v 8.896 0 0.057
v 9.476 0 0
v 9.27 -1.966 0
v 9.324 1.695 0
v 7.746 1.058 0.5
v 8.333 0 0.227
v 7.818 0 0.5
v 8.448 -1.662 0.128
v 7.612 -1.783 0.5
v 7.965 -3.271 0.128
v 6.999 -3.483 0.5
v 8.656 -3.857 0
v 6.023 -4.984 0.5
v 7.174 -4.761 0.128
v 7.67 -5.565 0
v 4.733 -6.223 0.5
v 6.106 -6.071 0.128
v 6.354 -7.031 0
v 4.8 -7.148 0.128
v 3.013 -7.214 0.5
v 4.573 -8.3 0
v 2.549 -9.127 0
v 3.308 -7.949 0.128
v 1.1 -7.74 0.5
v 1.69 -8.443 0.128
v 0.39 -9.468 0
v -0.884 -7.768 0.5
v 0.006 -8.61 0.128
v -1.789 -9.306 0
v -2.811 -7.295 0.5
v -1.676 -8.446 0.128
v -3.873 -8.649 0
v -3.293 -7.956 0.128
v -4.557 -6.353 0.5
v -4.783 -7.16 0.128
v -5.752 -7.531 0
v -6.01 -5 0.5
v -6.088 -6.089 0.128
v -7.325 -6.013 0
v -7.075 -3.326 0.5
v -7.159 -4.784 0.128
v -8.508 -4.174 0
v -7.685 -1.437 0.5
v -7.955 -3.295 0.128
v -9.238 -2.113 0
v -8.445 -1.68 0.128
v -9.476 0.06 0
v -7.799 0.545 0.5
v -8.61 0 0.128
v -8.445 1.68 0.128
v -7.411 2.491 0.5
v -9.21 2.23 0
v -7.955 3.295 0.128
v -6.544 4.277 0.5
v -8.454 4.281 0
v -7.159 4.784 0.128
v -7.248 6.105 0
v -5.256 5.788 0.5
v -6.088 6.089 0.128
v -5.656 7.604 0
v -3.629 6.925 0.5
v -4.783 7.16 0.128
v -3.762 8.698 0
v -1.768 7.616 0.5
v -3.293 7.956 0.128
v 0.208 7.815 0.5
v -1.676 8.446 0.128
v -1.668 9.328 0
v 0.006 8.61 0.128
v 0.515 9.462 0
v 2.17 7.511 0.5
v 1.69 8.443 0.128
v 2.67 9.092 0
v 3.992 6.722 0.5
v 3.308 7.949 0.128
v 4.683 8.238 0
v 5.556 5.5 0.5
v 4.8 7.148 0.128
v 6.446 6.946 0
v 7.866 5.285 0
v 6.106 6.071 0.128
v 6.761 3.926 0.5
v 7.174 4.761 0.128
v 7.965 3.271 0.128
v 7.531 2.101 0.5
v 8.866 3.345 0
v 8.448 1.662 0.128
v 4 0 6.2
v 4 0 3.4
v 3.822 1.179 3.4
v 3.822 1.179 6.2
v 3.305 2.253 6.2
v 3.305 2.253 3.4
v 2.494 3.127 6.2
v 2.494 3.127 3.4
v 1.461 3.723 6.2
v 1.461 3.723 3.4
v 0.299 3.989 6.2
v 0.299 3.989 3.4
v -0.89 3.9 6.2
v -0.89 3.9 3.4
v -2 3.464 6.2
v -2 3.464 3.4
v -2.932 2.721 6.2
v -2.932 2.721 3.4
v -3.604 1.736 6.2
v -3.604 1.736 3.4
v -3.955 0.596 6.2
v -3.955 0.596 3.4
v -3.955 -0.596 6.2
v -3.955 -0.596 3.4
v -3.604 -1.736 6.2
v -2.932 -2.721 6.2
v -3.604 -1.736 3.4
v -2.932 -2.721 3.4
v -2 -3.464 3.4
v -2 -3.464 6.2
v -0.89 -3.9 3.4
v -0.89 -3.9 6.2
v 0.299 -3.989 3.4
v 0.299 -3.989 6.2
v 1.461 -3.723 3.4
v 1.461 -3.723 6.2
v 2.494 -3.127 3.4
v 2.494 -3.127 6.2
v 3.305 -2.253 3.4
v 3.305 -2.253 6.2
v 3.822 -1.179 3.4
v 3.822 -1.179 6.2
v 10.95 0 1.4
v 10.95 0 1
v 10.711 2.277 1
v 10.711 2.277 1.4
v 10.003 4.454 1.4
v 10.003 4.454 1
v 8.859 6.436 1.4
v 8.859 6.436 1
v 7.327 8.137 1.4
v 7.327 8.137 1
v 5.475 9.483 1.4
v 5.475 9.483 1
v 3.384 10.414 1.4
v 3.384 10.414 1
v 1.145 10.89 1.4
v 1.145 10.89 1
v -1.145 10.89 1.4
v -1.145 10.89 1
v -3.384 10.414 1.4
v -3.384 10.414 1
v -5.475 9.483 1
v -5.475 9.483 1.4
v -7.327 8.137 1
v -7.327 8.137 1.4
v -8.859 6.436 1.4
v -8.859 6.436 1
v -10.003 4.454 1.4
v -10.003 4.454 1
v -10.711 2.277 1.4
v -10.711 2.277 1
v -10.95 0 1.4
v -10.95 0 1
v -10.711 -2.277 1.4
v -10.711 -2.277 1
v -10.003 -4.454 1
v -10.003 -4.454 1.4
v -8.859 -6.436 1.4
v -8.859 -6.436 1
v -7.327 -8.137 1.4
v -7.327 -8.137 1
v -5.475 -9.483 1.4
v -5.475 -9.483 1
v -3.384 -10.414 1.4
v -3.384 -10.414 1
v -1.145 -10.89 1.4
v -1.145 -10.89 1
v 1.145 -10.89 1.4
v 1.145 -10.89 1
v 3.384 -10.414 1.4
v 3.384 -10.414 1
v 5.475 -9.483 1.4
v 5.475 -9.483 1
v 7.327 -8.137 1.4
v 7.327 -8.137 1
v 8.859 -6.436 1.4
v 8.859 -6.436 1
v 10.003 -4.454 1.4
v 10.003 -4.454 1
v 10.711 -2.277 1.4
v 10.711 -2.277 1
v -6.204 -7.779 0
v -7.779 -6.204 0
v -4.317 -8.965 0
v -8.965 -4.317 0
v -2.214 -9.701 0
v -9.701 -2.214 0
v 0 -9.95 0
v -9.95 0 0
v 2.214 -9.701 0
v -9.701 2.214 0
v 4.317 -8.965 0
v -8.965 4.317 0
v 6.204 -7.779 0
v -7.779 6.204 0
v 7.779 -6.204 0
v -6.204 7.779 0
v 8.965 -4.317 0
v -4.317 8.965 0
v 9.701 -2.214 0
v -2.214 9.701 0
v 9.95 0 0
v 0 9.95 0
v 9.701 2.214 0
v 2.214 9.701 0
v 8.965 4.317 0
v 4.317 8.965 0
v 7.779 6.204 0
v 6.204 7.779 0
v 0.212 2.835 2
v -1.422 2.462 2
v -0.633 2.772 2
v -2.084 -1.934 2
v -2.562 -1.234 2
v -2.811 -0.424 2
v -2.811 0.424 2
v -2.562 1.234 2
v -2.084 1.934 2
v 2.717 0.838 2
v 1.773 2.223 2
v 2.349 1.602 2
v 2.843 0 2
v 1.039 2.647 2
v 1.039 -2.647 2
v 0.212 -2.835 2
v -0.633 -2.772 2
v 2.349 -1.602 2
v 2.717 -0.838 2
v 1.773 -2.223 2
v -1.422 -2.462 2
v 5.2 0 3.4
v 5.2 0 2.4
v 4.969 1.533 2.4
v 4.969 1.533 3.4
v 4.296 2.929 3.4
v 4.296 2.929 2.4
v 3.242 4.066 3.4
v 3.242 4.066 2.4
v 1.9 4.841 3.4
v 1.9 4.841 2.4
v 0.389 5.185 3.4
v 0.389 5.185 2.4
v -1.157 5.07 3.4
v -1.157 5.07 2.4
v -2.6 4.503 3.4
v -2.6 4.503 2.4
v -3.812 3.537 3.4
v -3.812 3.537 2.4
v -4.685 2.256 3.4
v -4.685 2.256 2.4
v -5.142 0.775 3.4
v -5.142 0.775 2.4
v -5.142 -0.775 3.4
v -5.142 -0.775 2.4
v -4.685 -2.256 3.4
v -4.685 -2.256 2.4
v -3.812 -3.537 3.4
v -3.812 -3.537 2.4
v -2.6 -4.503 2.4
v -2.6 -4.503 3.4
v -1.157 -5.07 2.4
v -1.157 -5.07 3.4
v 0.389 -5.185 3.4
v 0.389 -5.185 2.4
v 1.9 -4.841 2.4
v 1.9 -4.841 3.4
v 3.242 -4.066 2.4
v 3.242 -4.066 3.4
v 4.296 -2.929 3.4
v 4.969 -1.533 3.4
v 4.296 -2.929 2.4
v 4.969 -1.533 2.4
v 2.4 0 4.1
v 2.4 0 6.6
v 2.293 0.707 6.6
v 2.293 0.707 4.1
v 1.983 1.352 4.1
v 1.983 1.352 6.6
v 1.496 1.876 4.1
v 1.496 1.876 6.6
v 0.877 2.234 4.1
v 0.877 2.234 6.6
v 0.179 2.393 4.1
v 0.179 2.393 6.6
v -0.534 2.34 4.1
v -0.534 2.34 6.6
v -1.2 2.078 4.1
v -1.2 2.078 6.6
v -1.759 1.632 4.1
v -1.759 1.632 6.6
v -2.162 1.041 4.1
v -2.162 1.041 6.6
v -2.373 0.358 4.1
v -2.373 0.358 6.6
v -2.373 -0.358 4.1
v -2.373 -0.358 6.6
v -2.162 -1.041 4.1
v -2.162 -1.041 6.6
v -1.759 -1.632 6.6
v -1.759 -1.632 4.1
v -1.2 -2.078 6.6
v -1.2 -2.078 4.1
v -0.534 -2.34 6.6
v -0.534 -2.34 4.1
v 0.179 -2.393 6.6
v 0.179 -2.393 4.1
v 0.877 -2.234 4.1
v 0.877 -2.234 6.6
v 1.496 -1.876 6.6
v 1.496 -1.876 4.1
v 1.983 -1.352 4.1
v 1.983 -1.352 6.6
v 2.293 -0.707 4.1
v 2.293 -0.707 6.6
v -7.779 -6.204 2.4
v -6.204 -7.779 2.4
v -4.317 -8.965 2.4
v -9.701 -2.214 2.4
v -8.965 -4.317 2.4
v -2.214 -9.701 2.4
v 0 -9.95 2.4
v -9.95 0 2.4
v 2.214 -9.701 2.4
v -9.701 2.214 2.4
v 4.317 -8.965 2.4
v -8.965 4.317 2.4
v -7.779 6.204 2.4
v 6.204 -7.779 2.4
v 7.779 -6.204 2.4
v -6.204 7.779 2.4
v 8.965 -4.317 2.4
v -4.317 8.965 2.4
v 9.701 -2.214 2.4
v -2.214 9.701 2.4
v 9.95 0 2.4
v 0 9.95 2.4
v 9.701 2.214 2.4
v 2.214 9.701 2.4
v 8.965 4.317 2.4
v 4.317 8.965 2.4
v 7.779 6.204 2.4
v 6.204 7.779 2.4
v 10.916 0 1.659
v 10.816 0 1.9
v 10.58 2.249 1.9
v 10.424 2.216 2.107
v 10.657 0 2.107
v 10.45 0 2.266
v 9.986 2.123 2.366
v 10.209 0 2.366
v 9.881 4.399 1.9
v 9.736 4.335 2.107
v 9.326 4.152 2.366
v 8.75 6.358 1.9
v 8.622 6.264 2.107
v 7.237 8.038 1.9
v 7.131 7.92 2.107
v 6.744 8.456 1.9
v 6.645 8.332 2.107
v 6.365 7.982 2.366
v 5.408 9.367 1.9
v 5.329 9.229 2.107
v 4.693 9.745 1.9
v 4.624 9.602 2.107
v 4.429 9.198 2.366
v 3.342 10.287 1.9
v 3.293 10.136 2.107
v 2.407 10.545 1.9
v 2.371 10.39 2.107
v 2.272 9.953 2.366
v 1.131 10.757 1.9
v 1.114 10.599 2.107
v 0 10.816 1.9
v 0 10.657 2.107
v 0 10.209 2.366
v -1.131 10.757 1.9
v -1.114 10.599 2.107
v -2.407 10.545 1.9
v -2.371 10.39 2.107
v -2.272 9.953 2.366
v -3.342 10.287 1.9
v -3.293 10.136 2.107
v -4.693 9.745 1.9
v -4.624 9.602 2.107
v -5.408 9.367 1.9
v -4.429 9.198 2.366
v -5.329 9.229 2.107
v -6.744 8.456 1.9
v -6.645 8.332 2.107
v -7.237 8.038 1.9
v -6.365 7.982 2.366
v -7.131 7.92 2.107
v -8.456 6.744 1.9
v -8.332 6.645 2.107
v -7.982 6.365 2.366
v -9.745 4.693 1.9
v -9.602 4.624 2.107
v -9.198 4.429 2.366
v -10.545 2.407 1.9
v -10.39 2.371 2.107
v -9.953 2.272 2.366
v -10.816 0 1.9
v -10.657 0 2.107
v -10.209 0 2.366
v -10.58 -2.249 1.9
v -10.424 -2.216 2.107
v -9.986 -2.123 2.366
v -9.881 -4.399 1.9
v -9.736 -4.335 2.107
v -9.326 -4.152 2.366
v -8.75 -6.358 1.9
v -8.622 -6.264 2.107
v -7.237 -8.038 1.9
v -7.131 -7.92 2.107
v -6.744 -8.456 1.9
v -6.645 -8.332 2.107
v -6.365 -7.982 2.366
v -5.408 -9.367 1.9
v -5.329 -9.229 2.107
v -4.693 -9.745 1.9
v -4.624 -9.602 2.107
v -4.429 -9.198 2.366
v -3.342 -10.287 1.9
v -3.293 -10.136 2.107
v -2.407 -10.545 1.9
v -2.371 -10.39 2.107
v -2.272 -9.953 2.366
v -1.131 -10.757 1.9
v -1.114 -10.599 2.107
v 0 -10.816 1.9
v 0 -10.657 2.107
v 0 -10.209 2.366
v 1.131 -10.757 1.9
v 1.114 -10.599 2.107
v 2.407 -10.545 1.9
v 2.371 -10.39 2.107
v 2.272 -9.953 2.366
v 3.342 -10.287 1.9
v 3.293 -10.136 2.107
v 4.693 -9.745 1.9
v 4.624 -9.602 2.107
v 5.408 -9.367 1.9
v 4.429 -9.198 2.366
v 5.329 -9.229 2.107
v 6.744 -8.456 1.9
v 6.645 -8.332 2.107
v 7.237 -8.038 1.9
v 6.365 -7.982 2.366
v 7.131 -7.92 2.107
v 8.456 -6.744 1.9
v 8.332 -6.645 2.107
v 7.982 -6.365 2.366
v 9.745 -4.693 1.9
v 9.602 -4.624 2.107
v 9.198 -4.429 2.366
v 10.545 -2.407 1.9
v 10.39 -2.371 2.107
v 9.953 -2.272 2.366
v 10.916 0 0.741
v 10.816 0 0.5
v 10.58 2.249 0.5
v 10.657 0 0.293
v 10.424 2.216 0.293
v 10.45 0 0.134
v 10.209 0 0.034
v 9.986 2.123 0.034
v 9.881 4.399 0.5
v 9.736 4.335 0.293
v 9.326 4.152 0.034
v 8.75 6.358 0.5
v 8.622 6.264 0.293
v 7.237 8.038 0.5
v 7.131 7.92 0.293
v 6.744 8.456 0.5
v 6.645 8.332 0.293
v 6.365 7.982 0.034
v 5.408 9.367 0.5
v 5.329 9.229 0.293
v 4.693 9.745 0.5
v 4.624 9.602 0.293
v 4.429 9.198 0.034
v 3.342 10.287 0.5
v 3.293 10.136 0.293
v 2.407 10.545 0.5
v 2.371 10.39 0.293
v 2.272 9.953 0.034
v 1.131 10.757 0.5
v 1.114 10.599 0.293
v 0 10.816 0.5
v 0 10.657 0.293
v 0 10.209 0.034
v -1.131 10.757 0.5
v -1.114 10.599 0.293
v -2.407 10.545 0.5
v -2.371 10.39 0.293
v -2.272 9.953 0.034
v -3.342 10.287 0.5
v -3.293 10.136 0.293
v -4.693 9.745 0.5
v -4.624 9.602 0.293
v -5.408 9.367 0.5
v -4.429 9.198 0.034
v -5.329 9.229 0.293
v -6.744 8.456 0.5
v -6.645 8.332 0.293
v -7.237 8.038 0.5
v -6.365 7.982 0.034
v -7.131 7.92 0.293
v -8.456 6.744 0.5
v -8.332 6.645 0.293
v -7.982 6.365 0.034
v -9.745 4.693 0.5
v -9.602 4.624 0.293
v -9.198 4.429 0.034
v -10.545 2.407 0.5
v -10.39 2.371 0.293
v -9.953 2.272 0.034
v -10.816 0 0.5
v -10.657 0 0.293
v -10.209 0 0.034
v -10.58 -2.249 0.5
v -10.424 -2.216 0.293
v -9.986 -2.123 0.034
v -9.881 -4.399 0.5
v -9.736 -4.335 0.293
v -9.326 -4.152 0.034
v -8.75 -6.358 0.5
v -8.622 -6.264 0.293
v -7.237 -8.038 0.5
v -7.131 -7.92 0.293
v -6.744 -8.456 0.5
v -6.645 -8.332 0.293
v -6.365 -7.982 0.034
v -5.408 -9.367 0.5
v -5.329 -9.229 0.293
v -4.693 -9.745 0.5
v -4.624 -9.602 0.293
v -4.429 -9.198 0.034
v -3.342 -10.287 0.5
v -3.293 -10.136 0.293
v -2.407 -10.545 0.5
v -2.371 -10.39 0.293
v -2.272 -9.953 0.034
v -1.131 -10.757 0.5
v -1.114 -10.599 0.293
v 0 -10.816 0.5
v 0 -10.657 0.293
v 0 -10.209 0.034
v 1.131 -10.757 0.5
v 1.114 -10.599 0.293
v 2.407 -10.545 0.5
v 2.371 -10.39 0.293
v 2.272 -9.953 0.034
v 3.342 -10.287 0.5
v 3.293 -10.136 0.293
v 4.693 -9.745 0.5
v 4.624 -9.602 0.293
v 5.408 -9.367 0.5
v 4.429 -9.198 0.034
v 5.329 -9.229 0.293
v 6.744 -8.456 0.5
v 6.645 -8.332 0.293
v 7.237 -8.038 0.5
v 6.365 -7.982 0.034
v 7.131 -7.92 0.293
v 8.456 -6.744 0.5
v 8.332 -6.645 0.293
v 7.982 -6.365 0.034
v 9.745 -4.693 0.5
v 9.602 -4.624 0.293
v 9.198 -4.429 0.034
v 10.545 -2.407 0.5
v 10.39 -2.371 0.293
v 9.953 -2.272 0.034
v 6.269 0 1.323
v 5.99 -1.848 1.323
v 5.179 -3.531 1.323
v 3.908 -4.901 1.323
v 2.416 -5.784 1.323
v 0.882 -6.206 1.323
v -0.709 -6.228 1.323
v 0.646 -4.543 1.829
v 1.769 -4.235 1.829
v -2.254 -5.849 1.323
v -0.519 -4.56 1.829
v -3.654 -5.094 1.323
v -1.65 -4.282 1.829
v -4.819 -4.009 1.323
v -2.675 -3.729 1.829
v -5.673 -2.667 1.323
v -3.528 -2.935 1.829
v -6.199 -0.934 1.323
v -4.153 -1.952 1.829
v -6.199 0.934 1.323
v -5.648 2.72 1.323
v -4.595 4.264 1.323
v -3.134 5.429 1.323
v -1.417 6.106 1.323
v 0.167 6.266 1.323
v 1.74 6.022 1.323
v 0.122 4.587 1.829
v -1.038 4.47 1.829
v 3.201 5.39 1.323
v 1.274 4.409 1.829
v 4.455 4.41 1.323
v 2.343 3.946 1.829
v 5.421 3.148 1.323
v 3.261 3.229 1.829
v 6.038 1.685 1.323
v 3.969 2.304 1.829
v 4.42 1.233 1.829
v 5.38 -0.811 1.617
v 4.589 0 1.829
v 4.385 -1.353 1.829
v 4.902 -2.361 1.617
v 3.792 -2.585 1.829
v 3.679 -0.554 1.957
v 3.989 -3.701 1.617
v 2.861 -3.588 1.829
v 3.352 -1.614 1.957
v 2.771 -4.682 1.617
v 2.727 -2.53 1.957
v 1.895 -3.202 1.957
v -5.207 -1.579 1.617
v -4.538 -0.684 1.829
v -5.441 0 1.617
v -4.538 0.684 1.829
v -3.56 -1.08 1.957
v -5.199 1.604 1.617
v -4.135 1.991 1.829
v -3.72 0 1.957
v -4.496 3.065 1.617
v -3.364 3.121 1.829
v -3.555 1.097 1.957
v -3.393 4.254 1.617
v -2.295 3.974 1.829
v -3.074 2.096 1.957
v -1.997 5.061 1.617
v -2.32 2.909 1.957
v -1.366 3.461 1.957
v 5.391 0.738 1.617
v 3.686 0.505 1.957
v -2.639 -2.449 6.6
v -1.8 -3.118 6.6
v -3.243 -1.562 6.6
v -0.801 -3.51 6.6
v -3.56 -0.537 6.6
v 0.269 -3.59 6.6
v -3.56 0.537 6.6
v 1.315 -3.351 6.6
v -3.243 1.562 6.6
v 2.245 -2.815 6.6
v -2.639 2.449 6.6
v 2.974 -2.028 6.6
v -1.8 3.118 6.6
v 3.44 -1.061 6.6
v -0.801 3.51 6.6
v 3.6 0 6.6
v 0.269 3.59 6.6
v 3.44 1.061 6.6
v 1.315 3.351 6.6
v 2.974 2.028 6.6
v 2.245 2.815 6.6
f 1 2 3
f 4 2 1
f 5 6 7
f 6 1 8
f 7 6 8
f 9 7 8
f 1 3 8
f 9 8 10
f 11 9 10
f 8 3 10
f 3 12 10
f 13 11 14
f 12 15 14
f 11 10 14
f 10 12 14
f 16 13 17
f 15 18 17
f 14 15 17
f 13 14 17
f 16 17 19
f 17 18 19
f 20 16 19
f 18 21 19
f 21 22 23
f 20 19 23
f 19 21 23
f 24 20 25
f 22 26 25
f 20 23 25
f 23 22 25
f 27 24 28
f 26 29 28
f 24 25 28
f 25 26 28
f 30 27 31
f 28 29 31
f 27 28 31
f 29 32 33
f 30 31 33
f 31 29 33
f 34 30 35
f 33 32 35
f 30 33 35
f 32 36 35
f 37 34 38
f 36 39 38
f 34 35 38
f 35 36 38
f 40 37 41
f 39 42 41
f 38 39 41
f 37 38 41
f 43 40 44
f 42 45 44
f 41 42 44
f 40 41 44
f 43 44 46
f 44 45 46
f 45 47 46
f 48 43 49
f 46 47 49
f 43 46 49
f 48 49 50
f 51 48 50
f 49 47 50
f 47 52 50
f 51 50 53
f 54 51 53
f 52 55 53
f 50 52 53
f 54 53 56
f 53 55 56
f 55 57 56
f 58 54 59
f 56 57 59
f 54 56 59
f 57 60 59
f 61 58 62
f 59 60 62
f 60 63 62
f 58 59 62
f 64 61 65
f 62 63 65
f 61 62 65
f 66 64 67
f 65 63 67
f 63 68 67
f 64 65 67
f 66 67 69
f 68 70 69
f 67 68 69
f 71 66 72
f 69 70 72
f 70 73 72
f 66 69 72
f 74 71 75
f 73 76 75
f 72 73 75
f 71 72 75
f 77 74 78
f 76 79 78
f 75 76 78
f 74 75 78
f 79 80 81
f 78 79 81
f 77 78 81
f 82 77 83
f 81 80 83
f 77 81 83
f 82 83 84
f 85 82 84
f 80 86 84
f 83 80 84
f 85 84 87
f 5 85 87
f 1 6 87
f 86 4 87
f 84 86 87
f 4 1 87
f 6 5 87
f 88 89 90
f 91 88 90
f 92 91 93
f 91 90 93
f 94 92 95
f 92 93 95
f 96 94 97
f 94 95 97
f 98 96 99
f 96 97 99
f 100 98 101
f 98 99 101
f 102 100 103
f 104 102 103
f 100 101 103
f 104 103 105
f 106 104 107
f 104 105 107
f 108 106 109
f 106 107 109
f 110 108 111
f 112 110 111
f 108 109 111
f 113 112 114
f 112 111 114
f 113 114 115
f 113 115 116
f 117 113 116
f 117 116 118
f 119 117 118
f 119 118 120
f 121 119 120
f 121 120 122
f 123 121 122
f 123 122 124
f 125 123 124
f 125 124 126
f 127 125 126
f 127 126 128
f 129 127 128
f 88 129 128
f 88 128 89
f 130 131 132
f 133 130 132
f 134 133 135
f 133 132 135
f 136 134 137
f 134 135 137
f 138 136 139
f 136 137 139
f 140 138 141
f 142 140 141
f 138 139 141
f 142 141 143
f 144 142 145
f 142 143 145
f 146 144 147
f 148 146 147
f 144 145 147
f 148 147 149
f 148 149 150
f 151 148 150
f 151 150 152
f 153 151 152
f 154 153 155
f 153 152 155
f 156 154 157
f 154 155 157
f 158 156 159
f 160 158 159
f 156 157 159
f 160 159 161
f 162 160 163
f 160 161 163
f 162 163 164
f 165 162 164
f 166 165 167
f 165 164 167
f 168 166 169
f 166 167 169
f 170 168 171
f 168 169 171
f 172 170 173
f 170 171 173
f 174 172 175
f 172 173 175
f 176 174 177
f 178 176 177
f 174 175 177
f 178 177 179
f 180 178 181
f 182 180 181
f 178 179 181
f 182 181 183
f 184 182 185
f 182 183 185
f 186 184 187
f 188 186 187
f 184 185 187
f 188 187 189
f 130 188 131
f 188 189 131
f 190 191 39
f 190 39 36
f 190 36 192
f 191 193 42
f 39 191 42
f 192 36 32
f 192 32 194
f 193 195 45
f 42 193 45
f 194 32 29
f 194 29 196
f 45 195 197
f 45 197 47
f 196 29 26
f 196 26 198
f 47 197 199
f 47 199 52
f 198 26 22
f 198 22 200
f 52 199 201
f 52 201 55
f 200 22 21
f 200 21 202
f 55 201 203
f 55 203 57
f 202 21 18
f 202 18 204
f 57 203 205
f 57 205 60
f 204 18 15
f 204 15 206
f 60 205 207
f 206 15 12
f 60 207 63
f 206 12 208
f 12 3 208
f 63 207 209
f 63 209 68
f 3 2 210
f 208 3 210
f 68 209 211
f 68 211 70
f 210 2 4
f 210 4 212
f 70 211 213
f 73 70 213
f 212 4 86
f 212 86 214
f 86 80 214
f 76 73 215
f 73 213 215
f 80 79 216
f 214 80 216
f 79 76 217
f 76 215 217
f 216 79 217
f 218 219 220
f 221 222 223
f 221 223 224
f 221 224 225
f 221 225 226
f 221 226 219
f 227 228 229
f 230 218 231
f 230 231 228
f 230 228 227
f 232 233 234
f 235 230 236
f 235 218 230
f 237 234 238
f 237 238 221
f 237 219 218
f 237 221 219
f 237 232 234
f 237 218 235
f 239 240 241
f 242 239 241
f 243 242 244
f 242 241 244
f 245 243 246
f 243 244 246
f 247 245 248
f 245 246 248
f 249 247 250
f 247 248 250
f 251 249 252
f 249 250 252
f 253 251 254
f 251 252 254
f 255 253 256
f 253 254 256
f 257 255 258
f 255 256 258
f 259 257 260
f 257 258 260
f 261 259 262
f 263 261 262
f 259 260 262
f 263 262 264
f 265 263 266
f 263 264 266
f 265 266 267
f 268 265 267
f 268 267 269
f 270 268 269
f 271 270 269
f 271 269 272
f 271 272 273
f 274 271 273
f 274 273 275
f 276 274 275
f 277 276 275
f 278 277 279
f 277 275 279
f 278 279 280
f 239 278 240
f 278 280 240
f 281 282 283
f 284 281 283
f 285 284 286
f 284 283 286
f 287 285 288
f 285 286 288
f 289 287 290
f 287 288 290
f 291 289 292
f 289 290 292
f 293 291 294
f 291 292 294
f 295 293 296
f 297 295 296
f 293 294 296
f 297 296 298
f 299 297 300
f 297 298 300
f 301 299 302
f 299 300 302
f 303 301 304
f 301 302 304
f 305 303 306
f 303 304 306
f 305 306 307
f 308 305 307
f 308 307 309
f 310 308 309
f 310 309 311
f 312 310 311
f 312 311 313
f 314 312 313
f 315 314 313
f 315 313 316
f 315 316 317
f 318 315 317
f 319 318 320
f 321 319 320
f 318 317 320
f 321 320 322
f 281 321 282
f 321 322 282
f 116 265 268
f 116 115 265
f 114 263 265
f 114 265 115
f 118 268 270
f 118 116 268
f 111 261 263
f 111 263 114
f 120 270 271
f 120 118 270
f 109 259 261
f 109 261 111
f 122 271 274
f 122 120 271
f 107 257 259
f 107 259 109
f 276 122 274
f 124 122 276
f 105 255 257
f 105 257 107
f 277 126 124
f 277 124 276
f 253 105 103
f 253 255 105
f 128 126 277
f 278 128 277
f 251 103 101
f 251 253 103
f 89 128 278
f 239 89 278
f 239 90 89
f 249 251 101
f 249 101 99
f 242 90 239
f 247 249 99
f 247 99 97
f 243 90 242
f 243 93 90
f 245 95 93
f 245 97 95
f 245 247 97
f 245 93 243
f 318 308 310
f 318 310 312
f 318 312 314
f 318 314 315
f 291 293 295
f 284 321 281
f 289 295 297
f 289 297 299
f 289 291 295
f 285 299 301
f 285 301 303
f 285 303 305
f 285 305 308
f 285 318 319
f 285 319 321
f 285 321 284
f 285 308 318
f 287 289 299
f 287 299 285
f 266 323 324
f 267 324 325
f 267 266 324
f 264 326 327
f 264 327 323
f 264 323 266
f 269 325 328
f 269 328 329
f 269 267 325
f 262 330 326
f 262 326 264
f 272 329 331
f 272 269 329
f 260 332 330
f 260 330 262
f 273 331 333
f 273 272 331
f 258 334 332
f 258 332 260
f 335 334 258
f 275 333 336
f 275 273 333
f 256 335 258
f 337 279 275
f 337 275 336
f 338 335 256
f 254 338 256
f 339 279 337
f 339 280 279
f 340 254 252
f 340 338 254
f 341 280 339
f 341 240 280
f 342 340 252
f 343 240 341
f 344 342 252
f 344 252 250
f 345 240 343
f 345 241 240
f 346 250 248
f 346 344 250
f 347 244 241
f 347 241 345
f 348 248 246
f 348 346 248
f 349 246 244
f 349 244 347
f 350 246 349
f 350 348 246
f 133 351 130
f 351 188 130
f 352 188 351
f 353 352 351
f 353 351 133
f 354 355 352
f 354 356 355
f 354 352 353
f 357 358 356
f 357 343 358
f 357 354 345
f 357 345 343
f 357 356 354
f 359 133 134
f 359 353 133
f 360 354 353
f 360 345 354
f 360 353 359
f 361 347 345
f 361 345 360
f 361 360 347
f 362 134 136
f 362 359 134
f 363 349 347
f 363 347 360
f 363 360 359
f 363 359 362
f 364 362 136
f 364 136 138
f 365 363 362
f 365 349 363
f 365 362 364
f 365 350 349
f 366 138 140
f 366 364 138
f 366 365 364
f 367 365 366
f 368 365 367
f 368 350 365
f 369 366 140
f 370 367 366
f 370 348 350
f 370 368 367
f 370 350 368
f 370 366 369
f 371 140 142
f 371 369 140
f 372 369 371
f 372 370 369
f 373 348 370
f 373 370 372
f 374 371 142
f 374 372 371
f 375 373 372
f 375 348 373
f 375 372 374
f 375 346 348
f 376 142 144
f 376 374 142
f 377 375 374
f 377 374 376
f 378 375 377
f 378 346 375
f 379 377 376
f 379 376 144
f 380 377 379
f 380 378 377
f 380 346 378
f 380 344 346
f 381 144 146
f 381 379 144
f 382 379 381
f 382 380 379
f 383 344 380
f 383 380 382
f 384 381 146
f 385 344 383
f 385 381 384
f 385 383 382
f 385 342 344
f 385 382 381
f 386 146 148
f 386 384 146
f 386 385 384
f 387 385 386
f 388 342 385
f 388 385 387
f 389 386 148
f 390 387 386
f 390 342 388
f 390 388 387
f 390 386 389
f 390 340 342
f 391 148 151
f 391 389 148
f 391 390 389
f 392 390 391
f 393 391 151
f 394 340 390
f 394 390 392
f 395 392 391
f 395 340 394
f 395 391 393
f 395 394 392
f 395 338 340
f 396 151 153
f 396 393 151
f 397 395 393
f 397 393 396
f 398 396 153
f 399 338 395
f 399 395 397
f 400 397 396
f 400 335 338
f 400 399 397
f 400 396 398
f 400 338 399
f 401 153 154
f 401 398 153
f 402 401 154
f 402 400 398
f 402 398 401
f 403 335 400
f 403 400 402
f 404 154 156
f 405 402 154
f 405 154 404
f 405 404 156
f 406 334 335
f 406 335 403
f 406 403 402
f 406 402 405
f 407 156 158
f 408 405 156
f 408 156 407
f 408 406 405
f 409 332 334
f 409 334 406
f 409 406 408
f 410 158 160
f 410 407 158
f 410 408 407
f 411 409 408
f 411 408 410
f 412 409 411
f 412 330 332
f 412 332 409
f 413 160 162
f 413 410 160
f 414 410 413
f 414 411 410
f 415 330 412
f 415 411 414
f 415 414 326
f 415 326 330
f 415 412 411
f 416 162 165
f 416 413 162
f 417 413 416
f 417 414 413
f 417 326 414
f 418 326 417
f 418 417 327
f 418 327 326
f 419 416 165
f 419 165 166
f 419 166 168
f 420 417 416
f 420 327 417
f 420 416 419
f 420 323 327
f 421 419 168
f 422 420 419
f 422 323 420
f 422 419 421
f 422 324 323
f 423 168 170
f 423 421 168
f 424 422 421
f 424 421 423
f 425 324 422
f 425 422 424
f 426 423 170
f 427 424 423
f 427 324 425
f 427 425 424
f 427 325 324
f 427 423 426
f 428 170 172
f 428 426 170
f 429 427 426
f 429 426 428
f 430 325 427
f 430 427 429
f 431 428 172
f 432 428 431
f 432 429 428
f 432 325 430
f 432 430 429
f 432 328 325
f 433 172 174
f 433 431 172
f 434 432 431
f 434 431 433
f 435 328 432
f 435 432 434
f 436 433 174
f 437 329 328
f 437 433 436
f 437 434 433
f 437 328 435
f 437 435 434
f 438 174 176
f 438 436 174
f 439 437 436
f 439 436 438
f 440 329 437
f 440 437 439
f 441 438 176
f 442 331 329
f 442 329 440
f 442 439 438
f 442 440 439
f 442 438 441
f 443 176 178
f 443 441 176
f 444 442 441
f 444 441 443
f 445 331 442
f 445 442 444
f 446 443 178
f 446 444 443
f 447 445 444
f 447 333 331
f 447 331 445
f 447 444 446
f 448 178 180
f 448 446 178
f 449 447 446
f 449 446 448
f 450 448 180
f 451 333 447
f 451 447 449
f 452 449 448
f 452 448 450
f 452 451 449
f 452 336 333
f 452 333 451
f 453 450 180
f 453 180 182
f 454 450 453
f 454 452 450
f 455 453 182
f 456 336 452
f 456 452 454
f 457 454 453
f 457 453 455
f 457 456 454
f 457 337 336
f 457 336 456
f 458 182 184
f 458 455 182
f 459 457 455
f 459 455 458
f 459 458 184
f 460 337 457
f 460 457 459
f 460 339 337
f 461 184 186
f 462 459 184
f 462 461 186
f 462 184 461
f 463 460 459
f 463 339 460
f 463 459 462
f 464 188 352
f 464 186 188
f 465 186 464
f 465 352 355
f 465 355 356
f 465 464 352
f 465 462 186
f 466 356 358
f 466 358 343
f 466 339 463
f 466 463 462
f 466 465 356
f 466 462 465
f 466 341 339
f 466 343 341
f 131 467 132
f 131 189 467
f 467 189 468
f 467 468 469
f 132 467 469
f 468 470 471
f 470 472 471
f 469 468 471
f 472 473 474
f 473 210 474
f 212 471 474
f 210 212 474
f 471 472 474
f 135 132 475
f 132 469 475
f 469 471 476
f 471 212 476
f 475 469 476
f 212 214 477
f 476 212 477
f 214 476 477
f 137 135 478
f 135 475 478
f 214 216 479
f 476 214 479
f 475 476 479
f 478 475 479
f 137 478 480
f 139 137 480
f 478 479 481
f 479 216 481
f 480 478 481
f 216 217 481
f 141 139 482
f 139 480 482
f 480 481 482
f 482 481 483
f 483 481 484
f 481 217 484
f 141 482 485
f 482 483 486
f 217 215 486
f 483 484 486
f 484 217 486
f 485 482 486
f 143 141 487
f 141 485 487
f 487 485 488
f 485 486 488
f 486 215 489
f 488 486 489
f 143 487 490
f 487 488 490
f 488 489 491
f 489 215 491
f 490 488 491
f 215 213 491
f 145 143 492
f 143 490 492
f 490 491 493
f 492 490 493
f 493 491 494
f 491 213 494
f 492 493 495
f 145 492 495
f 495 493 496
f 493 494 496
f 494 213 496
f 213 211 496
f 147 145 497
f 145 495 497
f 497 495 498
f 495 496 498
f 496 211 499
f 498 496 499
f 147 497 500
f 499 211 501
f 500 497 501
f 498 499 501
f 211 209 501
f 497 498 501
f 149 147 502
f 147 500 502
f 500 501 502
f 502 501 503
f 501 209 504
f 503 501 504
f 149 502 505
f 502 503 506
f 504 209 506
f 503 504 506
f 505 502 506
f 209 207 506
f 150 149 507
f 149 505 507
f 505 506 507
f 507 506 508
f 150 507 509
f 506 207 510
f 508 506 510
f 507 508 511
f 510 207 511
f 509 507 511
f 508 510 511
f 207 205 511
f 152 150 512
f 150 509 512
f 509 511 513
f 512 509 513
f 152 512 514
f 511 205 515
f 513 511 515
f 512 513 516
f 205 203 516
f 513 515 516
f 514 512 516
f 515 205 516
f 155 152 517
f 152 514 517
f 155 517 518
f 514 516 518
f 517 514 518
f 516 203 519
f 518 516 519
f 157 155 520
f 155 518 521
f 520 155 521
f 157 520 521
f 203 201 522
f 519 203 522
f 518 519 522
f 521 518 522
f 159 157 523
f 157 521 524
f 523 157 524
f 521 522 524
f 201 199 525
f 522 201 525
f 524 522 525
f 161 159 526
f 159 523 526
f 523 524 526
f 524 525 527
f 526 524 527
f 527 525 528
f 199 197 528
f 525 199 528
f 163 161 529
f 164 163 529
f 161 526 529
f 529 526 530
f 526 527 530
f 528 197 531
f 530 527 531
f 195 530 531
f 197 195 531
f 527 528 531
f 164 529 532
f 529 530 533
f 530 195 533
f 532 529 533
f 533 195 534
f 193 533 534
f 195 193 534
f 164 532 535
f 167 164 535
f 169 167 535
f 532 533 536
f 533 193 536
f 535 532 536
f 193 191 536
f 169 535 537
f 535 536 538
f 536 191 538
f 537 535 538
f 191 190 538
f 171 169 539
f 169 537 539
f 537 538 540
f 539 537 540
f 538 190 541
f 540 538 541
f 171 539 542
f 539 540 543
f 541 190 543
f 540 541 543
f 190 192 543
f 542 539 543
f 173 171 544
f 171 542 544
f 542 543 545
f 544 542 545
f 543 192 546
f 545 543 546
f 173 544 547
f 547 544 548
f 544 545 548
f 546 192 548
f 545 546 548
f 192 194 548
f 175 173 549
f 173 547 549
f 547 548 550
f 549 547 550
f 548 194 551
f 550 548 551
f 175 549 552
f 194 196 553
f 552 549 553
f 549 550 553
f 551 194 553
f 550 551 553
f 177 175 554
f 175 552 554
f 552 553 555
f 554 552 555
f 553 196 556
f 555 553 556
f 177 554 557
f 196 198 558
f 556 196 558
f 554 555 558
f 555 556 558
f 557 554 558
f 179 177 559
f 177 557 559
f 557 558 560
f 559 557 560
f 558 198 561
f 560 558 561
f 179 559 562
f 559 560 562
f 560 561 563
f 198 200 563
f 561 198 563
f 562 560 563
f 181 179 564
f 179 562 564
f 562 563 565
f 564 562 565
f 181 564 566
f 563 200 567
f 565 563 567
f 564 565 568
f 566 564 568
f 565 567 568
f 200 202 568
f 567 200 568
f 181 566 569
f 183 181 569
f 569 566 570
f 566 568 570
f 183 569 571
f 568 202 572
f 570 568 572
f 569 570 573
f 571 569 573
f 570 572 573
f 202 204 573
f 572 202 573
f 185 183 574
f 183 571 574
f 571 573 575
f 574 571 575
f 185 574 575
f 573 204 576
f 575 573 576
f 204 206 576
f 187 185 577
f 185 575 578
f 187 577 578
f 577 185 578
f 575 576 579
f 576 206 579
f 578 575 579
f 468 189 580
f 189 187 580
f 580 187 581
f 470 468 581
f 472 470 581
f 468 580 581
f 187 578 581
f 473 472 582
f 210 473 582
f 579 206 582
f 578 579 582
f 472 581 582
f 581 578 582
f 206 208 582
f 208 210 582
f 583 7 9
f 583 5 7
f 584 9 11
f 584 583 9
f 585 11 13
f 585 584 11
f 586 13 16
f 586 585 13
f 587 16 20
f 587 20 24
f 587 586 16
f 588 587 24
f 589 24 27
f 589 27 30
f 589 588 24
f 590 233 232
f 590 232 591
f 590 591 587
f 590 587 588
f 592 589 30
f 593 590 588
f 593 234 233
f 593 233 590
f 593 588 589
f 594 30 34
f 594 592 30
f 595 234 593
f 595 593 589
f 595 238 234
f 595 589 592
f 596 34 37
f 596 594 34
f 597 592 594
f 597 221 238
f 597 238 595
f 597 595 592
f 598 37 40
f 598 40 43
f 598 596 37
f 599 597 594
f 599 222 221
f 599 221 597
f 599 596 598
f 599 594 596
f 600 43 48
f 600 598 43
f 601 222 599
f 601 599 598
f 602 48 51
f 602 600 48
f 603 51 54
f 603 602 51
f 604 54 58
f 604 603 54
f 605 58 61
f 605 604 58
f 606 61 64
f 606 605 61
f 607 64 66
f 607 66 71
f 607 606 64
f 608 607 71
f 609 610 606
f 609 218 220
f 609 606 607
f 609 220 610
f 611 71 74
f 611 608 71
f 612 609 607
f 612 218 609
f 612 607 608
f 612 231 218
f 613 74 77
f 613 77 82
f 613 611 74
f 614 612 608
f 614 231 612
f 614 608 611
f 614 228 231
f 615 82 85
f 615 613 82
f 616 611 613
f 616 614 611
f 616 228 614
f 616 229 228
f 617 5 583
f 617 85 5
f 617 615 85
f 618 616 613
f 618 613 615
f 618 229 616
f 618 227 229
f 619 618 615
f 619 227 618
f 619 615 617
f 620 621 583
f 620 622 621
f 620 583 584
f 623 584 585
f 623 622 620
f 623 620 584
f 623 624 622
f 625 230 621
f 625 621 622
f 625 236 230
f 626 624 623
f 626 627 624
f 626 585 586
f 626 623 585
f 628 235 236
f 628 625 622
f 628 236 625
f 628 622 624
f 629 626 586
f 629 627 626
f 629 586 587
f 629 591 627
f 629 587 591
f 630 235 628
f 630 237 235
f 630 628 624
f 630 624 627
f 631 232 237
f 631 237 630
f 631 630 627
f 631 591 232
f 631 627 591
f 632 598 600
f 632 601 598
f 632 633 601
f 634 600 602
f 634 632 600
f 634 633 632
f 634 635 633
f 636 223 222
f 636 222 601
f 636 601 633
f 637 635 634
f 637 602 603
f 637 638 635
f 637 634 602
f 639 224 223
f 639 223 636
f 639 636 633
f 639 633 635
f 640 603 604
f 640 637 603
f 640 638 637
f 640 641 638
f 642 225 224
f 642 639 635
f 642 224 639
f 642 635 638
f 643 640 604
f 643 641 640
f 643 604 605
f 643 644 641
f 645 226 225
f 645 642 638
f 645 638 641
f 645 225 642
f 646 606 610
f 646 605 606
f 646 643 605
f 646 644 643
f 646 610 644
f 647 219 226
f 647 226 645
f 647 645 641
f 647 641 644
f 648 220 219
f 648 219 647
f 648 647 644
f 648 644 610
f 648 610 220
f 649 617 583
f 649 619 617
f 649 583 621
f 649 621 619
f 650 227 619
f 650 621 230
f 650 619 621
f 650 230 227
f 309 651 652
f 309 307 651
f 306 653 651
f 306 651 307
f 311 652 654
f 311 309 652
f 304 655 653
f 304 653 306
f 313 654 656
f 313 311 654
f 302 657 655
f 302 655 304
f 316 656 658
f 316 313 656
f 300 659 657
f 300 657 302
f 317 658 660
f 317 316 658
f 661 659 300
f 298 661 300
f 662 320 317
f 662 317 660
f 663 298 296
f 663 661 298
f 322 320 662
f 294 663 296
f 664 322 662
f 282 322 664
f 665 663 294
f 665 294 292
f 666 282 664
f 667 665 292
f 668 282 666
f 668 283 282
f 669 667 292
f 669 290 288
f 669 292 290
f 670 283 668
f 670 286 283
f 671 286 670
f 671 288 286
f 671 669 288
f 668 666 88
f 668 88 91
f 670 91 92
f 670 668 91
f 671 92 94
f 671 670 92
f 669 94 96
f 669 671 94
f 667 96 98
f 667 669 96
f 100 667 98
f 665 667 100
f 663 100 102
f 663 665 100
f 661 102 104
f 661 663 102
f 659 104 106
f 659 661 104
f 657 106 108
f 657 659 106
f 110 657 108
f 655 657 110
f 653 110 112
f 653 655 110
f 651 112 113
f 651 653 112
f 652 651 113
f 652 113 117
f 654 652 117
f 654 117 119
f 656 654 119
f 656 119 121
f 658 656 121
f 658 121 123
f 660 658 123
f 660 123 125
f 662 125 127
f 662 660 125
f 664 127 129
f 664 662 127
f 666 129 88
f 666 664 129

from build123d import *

# Parameters (mm, degrees)
F0_R      = 10.95
F1_DEPTH  = 2.4
F2_R      = 4
F3_DEPTH  = 4.2
F4_R      = 1
F5_R      = 5.2
F5_R_2    = 4
F6_DEPTH  = 1
F7_R      = 1
F8_R      = 8.5
F9_DEPTH  = 2
F11_SIZE  = 0.4
F12_R     = 3
F13_R     = 2.4
F14_DEPTH = 2.5


# Not quite as in the source:
# - a fillet or chamfer that OpenCascade refuses, or shapes differently, is made with other operations: its cross-section is extruded or revolved along the edge and cut away or added


with BuildPart() as f1:
    # F0 (on Top) → F1 (new body)
    with BuildSketch(Plane.XY):
        Circle(F0_R)
    extrude(amount=F1_DEPTH)

    # F2 (on face) → F3 (join)
    with BuildSketch(Plane.XY.offset(2.4)):
        Circle(F2_R)
    extrude(amount=F3_DEPTH)

    # F4
    f4_edges = [f1.edges().sort_by_distance(p)[0] for p in [
        (-10.95, 0, 2.4),
    ]]
    fillet(f4_edges, radius=F4_R)

    # F5 (on face) → F6 (join)
    with BuildSketch(Plane.XY.offset(2.4)):
        Circle(F5_R)
        Circle(F5_R_2, mode=Mode.SUBTRACT)
    extrude(amount=F6_DEPTH)

    # F7
    f7_edges = [f1.edges().sort_by_distance(p)[0] for p in [
        (-10.95, 0, 0),
    ]]
    fillet(f7_edges, radius=F7_R)

    # F8 (on face) → F9 (cut)
    with BuildSketch(Plane(origin=(0, 0, 0), x_dir=(1, 0, 0), z_dir=(0, 0, -1))):
        Circle(F8_R)
    extrude(amount=-F9_DEPTH, mode=Mode.SUBTRACT)

    # F10: fillet of radius 9 on 1 edges, made by hand

    # F10_s1 → F10_t2 (revolve)
    with BuildSketch(Plane.XZ):
        with BuildLine():
            ThreePointArc((8.5, 0), (5.8431457505, 1.4852813742), (2.8431457505, 2))
            Line((2.8431457505, 2), (8.5, 2))
            Line((8.5, 2), (8.5, 0))
        make_face()
    revolve(axis=Axis((0, 0, 2), (0, 0, -1)))

    # F11
    f11_edges = [f1.edges().sort_by_distance(p)[0] for p in [
        (-4, 0, 6.6),
    ]]
    chamfer(f11_edges, length=F11_SIZE)

    # F12
    f12_edges = [f1.edges().sort_by_distance(p)[0] for p in [
        (-8.5, 0, 0),
    ]]
    fillet(f12_edges, radius=F12_R)

    # F13 (on face) → F14 (cut)
    with BuildSketch(Plane.XY.offset(6.6)):
        Circle(F13_R)
    extrude(amount=-F14_DEPTH, mode=Mode.SUBTRACT)


solid = f1.part
